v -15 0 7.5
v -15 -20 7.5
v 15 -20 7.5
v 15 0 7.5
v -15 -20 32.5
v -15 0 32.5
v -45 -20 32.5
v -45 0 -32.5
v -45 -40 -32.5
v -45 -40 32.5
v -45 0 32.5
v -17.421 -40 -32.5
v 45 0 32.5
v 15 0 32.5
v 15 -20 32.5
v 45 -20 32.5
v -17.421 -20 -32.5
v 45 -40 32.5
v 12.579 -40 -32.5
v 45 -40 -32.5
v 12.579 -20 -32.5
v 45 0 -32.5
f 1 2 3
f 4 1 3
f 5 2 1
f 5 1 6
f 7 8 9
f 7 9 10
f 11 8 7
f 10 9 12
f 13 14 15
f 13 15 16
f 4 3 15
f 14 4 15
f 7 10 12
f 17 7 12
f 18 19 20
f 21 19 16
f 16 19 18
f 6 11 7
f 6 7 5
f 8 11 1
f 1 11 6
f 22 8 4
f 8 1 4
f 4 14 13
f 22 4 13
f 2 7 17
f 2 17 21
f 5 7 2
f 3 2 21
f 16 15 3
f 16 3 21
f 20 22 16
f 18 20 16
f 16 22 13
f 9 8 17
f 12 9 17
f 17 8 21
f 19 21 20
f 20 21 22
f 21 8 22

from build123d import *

# Parameters (mm, degrees)
F0_W     = 90
F0_H     = 65
F1_DEPTH = 40
F3_DEPTH = 20
F4_W     = 30
F4_H     = 50
F5_DEPTH = 20.001


with BuildPart() as f1:
    # F0 (on Front) → F1 (new body)
    with BuildSketch(Plane.XZ):
        Rectangle(F0_W, F0_H)
    extrude(amount=F1_DEPTH)

    # F2 (on face) → F3 (cut)
    with BuildSketch(Plane.XZ.offset(40)):
        Polygon((-45, 32.5), (-17.421313, -32.5), (12.578687, -32.5), (45, 32.5), align=None)
    extrude(amount=-F3_DEPTH, mode=Mode.SUBTRACT)

    # F4 (on face) → F5 (cut, through all)
    with BuildSketch(Plane.XZ.offset(20)):
        with Locations((0, 32.5)):
            Rectangle(F4_W, F4_H)
    extrude(amount=-F5_DEPTH, mode=Mode.SUBTRACT)


solid = f1.part
